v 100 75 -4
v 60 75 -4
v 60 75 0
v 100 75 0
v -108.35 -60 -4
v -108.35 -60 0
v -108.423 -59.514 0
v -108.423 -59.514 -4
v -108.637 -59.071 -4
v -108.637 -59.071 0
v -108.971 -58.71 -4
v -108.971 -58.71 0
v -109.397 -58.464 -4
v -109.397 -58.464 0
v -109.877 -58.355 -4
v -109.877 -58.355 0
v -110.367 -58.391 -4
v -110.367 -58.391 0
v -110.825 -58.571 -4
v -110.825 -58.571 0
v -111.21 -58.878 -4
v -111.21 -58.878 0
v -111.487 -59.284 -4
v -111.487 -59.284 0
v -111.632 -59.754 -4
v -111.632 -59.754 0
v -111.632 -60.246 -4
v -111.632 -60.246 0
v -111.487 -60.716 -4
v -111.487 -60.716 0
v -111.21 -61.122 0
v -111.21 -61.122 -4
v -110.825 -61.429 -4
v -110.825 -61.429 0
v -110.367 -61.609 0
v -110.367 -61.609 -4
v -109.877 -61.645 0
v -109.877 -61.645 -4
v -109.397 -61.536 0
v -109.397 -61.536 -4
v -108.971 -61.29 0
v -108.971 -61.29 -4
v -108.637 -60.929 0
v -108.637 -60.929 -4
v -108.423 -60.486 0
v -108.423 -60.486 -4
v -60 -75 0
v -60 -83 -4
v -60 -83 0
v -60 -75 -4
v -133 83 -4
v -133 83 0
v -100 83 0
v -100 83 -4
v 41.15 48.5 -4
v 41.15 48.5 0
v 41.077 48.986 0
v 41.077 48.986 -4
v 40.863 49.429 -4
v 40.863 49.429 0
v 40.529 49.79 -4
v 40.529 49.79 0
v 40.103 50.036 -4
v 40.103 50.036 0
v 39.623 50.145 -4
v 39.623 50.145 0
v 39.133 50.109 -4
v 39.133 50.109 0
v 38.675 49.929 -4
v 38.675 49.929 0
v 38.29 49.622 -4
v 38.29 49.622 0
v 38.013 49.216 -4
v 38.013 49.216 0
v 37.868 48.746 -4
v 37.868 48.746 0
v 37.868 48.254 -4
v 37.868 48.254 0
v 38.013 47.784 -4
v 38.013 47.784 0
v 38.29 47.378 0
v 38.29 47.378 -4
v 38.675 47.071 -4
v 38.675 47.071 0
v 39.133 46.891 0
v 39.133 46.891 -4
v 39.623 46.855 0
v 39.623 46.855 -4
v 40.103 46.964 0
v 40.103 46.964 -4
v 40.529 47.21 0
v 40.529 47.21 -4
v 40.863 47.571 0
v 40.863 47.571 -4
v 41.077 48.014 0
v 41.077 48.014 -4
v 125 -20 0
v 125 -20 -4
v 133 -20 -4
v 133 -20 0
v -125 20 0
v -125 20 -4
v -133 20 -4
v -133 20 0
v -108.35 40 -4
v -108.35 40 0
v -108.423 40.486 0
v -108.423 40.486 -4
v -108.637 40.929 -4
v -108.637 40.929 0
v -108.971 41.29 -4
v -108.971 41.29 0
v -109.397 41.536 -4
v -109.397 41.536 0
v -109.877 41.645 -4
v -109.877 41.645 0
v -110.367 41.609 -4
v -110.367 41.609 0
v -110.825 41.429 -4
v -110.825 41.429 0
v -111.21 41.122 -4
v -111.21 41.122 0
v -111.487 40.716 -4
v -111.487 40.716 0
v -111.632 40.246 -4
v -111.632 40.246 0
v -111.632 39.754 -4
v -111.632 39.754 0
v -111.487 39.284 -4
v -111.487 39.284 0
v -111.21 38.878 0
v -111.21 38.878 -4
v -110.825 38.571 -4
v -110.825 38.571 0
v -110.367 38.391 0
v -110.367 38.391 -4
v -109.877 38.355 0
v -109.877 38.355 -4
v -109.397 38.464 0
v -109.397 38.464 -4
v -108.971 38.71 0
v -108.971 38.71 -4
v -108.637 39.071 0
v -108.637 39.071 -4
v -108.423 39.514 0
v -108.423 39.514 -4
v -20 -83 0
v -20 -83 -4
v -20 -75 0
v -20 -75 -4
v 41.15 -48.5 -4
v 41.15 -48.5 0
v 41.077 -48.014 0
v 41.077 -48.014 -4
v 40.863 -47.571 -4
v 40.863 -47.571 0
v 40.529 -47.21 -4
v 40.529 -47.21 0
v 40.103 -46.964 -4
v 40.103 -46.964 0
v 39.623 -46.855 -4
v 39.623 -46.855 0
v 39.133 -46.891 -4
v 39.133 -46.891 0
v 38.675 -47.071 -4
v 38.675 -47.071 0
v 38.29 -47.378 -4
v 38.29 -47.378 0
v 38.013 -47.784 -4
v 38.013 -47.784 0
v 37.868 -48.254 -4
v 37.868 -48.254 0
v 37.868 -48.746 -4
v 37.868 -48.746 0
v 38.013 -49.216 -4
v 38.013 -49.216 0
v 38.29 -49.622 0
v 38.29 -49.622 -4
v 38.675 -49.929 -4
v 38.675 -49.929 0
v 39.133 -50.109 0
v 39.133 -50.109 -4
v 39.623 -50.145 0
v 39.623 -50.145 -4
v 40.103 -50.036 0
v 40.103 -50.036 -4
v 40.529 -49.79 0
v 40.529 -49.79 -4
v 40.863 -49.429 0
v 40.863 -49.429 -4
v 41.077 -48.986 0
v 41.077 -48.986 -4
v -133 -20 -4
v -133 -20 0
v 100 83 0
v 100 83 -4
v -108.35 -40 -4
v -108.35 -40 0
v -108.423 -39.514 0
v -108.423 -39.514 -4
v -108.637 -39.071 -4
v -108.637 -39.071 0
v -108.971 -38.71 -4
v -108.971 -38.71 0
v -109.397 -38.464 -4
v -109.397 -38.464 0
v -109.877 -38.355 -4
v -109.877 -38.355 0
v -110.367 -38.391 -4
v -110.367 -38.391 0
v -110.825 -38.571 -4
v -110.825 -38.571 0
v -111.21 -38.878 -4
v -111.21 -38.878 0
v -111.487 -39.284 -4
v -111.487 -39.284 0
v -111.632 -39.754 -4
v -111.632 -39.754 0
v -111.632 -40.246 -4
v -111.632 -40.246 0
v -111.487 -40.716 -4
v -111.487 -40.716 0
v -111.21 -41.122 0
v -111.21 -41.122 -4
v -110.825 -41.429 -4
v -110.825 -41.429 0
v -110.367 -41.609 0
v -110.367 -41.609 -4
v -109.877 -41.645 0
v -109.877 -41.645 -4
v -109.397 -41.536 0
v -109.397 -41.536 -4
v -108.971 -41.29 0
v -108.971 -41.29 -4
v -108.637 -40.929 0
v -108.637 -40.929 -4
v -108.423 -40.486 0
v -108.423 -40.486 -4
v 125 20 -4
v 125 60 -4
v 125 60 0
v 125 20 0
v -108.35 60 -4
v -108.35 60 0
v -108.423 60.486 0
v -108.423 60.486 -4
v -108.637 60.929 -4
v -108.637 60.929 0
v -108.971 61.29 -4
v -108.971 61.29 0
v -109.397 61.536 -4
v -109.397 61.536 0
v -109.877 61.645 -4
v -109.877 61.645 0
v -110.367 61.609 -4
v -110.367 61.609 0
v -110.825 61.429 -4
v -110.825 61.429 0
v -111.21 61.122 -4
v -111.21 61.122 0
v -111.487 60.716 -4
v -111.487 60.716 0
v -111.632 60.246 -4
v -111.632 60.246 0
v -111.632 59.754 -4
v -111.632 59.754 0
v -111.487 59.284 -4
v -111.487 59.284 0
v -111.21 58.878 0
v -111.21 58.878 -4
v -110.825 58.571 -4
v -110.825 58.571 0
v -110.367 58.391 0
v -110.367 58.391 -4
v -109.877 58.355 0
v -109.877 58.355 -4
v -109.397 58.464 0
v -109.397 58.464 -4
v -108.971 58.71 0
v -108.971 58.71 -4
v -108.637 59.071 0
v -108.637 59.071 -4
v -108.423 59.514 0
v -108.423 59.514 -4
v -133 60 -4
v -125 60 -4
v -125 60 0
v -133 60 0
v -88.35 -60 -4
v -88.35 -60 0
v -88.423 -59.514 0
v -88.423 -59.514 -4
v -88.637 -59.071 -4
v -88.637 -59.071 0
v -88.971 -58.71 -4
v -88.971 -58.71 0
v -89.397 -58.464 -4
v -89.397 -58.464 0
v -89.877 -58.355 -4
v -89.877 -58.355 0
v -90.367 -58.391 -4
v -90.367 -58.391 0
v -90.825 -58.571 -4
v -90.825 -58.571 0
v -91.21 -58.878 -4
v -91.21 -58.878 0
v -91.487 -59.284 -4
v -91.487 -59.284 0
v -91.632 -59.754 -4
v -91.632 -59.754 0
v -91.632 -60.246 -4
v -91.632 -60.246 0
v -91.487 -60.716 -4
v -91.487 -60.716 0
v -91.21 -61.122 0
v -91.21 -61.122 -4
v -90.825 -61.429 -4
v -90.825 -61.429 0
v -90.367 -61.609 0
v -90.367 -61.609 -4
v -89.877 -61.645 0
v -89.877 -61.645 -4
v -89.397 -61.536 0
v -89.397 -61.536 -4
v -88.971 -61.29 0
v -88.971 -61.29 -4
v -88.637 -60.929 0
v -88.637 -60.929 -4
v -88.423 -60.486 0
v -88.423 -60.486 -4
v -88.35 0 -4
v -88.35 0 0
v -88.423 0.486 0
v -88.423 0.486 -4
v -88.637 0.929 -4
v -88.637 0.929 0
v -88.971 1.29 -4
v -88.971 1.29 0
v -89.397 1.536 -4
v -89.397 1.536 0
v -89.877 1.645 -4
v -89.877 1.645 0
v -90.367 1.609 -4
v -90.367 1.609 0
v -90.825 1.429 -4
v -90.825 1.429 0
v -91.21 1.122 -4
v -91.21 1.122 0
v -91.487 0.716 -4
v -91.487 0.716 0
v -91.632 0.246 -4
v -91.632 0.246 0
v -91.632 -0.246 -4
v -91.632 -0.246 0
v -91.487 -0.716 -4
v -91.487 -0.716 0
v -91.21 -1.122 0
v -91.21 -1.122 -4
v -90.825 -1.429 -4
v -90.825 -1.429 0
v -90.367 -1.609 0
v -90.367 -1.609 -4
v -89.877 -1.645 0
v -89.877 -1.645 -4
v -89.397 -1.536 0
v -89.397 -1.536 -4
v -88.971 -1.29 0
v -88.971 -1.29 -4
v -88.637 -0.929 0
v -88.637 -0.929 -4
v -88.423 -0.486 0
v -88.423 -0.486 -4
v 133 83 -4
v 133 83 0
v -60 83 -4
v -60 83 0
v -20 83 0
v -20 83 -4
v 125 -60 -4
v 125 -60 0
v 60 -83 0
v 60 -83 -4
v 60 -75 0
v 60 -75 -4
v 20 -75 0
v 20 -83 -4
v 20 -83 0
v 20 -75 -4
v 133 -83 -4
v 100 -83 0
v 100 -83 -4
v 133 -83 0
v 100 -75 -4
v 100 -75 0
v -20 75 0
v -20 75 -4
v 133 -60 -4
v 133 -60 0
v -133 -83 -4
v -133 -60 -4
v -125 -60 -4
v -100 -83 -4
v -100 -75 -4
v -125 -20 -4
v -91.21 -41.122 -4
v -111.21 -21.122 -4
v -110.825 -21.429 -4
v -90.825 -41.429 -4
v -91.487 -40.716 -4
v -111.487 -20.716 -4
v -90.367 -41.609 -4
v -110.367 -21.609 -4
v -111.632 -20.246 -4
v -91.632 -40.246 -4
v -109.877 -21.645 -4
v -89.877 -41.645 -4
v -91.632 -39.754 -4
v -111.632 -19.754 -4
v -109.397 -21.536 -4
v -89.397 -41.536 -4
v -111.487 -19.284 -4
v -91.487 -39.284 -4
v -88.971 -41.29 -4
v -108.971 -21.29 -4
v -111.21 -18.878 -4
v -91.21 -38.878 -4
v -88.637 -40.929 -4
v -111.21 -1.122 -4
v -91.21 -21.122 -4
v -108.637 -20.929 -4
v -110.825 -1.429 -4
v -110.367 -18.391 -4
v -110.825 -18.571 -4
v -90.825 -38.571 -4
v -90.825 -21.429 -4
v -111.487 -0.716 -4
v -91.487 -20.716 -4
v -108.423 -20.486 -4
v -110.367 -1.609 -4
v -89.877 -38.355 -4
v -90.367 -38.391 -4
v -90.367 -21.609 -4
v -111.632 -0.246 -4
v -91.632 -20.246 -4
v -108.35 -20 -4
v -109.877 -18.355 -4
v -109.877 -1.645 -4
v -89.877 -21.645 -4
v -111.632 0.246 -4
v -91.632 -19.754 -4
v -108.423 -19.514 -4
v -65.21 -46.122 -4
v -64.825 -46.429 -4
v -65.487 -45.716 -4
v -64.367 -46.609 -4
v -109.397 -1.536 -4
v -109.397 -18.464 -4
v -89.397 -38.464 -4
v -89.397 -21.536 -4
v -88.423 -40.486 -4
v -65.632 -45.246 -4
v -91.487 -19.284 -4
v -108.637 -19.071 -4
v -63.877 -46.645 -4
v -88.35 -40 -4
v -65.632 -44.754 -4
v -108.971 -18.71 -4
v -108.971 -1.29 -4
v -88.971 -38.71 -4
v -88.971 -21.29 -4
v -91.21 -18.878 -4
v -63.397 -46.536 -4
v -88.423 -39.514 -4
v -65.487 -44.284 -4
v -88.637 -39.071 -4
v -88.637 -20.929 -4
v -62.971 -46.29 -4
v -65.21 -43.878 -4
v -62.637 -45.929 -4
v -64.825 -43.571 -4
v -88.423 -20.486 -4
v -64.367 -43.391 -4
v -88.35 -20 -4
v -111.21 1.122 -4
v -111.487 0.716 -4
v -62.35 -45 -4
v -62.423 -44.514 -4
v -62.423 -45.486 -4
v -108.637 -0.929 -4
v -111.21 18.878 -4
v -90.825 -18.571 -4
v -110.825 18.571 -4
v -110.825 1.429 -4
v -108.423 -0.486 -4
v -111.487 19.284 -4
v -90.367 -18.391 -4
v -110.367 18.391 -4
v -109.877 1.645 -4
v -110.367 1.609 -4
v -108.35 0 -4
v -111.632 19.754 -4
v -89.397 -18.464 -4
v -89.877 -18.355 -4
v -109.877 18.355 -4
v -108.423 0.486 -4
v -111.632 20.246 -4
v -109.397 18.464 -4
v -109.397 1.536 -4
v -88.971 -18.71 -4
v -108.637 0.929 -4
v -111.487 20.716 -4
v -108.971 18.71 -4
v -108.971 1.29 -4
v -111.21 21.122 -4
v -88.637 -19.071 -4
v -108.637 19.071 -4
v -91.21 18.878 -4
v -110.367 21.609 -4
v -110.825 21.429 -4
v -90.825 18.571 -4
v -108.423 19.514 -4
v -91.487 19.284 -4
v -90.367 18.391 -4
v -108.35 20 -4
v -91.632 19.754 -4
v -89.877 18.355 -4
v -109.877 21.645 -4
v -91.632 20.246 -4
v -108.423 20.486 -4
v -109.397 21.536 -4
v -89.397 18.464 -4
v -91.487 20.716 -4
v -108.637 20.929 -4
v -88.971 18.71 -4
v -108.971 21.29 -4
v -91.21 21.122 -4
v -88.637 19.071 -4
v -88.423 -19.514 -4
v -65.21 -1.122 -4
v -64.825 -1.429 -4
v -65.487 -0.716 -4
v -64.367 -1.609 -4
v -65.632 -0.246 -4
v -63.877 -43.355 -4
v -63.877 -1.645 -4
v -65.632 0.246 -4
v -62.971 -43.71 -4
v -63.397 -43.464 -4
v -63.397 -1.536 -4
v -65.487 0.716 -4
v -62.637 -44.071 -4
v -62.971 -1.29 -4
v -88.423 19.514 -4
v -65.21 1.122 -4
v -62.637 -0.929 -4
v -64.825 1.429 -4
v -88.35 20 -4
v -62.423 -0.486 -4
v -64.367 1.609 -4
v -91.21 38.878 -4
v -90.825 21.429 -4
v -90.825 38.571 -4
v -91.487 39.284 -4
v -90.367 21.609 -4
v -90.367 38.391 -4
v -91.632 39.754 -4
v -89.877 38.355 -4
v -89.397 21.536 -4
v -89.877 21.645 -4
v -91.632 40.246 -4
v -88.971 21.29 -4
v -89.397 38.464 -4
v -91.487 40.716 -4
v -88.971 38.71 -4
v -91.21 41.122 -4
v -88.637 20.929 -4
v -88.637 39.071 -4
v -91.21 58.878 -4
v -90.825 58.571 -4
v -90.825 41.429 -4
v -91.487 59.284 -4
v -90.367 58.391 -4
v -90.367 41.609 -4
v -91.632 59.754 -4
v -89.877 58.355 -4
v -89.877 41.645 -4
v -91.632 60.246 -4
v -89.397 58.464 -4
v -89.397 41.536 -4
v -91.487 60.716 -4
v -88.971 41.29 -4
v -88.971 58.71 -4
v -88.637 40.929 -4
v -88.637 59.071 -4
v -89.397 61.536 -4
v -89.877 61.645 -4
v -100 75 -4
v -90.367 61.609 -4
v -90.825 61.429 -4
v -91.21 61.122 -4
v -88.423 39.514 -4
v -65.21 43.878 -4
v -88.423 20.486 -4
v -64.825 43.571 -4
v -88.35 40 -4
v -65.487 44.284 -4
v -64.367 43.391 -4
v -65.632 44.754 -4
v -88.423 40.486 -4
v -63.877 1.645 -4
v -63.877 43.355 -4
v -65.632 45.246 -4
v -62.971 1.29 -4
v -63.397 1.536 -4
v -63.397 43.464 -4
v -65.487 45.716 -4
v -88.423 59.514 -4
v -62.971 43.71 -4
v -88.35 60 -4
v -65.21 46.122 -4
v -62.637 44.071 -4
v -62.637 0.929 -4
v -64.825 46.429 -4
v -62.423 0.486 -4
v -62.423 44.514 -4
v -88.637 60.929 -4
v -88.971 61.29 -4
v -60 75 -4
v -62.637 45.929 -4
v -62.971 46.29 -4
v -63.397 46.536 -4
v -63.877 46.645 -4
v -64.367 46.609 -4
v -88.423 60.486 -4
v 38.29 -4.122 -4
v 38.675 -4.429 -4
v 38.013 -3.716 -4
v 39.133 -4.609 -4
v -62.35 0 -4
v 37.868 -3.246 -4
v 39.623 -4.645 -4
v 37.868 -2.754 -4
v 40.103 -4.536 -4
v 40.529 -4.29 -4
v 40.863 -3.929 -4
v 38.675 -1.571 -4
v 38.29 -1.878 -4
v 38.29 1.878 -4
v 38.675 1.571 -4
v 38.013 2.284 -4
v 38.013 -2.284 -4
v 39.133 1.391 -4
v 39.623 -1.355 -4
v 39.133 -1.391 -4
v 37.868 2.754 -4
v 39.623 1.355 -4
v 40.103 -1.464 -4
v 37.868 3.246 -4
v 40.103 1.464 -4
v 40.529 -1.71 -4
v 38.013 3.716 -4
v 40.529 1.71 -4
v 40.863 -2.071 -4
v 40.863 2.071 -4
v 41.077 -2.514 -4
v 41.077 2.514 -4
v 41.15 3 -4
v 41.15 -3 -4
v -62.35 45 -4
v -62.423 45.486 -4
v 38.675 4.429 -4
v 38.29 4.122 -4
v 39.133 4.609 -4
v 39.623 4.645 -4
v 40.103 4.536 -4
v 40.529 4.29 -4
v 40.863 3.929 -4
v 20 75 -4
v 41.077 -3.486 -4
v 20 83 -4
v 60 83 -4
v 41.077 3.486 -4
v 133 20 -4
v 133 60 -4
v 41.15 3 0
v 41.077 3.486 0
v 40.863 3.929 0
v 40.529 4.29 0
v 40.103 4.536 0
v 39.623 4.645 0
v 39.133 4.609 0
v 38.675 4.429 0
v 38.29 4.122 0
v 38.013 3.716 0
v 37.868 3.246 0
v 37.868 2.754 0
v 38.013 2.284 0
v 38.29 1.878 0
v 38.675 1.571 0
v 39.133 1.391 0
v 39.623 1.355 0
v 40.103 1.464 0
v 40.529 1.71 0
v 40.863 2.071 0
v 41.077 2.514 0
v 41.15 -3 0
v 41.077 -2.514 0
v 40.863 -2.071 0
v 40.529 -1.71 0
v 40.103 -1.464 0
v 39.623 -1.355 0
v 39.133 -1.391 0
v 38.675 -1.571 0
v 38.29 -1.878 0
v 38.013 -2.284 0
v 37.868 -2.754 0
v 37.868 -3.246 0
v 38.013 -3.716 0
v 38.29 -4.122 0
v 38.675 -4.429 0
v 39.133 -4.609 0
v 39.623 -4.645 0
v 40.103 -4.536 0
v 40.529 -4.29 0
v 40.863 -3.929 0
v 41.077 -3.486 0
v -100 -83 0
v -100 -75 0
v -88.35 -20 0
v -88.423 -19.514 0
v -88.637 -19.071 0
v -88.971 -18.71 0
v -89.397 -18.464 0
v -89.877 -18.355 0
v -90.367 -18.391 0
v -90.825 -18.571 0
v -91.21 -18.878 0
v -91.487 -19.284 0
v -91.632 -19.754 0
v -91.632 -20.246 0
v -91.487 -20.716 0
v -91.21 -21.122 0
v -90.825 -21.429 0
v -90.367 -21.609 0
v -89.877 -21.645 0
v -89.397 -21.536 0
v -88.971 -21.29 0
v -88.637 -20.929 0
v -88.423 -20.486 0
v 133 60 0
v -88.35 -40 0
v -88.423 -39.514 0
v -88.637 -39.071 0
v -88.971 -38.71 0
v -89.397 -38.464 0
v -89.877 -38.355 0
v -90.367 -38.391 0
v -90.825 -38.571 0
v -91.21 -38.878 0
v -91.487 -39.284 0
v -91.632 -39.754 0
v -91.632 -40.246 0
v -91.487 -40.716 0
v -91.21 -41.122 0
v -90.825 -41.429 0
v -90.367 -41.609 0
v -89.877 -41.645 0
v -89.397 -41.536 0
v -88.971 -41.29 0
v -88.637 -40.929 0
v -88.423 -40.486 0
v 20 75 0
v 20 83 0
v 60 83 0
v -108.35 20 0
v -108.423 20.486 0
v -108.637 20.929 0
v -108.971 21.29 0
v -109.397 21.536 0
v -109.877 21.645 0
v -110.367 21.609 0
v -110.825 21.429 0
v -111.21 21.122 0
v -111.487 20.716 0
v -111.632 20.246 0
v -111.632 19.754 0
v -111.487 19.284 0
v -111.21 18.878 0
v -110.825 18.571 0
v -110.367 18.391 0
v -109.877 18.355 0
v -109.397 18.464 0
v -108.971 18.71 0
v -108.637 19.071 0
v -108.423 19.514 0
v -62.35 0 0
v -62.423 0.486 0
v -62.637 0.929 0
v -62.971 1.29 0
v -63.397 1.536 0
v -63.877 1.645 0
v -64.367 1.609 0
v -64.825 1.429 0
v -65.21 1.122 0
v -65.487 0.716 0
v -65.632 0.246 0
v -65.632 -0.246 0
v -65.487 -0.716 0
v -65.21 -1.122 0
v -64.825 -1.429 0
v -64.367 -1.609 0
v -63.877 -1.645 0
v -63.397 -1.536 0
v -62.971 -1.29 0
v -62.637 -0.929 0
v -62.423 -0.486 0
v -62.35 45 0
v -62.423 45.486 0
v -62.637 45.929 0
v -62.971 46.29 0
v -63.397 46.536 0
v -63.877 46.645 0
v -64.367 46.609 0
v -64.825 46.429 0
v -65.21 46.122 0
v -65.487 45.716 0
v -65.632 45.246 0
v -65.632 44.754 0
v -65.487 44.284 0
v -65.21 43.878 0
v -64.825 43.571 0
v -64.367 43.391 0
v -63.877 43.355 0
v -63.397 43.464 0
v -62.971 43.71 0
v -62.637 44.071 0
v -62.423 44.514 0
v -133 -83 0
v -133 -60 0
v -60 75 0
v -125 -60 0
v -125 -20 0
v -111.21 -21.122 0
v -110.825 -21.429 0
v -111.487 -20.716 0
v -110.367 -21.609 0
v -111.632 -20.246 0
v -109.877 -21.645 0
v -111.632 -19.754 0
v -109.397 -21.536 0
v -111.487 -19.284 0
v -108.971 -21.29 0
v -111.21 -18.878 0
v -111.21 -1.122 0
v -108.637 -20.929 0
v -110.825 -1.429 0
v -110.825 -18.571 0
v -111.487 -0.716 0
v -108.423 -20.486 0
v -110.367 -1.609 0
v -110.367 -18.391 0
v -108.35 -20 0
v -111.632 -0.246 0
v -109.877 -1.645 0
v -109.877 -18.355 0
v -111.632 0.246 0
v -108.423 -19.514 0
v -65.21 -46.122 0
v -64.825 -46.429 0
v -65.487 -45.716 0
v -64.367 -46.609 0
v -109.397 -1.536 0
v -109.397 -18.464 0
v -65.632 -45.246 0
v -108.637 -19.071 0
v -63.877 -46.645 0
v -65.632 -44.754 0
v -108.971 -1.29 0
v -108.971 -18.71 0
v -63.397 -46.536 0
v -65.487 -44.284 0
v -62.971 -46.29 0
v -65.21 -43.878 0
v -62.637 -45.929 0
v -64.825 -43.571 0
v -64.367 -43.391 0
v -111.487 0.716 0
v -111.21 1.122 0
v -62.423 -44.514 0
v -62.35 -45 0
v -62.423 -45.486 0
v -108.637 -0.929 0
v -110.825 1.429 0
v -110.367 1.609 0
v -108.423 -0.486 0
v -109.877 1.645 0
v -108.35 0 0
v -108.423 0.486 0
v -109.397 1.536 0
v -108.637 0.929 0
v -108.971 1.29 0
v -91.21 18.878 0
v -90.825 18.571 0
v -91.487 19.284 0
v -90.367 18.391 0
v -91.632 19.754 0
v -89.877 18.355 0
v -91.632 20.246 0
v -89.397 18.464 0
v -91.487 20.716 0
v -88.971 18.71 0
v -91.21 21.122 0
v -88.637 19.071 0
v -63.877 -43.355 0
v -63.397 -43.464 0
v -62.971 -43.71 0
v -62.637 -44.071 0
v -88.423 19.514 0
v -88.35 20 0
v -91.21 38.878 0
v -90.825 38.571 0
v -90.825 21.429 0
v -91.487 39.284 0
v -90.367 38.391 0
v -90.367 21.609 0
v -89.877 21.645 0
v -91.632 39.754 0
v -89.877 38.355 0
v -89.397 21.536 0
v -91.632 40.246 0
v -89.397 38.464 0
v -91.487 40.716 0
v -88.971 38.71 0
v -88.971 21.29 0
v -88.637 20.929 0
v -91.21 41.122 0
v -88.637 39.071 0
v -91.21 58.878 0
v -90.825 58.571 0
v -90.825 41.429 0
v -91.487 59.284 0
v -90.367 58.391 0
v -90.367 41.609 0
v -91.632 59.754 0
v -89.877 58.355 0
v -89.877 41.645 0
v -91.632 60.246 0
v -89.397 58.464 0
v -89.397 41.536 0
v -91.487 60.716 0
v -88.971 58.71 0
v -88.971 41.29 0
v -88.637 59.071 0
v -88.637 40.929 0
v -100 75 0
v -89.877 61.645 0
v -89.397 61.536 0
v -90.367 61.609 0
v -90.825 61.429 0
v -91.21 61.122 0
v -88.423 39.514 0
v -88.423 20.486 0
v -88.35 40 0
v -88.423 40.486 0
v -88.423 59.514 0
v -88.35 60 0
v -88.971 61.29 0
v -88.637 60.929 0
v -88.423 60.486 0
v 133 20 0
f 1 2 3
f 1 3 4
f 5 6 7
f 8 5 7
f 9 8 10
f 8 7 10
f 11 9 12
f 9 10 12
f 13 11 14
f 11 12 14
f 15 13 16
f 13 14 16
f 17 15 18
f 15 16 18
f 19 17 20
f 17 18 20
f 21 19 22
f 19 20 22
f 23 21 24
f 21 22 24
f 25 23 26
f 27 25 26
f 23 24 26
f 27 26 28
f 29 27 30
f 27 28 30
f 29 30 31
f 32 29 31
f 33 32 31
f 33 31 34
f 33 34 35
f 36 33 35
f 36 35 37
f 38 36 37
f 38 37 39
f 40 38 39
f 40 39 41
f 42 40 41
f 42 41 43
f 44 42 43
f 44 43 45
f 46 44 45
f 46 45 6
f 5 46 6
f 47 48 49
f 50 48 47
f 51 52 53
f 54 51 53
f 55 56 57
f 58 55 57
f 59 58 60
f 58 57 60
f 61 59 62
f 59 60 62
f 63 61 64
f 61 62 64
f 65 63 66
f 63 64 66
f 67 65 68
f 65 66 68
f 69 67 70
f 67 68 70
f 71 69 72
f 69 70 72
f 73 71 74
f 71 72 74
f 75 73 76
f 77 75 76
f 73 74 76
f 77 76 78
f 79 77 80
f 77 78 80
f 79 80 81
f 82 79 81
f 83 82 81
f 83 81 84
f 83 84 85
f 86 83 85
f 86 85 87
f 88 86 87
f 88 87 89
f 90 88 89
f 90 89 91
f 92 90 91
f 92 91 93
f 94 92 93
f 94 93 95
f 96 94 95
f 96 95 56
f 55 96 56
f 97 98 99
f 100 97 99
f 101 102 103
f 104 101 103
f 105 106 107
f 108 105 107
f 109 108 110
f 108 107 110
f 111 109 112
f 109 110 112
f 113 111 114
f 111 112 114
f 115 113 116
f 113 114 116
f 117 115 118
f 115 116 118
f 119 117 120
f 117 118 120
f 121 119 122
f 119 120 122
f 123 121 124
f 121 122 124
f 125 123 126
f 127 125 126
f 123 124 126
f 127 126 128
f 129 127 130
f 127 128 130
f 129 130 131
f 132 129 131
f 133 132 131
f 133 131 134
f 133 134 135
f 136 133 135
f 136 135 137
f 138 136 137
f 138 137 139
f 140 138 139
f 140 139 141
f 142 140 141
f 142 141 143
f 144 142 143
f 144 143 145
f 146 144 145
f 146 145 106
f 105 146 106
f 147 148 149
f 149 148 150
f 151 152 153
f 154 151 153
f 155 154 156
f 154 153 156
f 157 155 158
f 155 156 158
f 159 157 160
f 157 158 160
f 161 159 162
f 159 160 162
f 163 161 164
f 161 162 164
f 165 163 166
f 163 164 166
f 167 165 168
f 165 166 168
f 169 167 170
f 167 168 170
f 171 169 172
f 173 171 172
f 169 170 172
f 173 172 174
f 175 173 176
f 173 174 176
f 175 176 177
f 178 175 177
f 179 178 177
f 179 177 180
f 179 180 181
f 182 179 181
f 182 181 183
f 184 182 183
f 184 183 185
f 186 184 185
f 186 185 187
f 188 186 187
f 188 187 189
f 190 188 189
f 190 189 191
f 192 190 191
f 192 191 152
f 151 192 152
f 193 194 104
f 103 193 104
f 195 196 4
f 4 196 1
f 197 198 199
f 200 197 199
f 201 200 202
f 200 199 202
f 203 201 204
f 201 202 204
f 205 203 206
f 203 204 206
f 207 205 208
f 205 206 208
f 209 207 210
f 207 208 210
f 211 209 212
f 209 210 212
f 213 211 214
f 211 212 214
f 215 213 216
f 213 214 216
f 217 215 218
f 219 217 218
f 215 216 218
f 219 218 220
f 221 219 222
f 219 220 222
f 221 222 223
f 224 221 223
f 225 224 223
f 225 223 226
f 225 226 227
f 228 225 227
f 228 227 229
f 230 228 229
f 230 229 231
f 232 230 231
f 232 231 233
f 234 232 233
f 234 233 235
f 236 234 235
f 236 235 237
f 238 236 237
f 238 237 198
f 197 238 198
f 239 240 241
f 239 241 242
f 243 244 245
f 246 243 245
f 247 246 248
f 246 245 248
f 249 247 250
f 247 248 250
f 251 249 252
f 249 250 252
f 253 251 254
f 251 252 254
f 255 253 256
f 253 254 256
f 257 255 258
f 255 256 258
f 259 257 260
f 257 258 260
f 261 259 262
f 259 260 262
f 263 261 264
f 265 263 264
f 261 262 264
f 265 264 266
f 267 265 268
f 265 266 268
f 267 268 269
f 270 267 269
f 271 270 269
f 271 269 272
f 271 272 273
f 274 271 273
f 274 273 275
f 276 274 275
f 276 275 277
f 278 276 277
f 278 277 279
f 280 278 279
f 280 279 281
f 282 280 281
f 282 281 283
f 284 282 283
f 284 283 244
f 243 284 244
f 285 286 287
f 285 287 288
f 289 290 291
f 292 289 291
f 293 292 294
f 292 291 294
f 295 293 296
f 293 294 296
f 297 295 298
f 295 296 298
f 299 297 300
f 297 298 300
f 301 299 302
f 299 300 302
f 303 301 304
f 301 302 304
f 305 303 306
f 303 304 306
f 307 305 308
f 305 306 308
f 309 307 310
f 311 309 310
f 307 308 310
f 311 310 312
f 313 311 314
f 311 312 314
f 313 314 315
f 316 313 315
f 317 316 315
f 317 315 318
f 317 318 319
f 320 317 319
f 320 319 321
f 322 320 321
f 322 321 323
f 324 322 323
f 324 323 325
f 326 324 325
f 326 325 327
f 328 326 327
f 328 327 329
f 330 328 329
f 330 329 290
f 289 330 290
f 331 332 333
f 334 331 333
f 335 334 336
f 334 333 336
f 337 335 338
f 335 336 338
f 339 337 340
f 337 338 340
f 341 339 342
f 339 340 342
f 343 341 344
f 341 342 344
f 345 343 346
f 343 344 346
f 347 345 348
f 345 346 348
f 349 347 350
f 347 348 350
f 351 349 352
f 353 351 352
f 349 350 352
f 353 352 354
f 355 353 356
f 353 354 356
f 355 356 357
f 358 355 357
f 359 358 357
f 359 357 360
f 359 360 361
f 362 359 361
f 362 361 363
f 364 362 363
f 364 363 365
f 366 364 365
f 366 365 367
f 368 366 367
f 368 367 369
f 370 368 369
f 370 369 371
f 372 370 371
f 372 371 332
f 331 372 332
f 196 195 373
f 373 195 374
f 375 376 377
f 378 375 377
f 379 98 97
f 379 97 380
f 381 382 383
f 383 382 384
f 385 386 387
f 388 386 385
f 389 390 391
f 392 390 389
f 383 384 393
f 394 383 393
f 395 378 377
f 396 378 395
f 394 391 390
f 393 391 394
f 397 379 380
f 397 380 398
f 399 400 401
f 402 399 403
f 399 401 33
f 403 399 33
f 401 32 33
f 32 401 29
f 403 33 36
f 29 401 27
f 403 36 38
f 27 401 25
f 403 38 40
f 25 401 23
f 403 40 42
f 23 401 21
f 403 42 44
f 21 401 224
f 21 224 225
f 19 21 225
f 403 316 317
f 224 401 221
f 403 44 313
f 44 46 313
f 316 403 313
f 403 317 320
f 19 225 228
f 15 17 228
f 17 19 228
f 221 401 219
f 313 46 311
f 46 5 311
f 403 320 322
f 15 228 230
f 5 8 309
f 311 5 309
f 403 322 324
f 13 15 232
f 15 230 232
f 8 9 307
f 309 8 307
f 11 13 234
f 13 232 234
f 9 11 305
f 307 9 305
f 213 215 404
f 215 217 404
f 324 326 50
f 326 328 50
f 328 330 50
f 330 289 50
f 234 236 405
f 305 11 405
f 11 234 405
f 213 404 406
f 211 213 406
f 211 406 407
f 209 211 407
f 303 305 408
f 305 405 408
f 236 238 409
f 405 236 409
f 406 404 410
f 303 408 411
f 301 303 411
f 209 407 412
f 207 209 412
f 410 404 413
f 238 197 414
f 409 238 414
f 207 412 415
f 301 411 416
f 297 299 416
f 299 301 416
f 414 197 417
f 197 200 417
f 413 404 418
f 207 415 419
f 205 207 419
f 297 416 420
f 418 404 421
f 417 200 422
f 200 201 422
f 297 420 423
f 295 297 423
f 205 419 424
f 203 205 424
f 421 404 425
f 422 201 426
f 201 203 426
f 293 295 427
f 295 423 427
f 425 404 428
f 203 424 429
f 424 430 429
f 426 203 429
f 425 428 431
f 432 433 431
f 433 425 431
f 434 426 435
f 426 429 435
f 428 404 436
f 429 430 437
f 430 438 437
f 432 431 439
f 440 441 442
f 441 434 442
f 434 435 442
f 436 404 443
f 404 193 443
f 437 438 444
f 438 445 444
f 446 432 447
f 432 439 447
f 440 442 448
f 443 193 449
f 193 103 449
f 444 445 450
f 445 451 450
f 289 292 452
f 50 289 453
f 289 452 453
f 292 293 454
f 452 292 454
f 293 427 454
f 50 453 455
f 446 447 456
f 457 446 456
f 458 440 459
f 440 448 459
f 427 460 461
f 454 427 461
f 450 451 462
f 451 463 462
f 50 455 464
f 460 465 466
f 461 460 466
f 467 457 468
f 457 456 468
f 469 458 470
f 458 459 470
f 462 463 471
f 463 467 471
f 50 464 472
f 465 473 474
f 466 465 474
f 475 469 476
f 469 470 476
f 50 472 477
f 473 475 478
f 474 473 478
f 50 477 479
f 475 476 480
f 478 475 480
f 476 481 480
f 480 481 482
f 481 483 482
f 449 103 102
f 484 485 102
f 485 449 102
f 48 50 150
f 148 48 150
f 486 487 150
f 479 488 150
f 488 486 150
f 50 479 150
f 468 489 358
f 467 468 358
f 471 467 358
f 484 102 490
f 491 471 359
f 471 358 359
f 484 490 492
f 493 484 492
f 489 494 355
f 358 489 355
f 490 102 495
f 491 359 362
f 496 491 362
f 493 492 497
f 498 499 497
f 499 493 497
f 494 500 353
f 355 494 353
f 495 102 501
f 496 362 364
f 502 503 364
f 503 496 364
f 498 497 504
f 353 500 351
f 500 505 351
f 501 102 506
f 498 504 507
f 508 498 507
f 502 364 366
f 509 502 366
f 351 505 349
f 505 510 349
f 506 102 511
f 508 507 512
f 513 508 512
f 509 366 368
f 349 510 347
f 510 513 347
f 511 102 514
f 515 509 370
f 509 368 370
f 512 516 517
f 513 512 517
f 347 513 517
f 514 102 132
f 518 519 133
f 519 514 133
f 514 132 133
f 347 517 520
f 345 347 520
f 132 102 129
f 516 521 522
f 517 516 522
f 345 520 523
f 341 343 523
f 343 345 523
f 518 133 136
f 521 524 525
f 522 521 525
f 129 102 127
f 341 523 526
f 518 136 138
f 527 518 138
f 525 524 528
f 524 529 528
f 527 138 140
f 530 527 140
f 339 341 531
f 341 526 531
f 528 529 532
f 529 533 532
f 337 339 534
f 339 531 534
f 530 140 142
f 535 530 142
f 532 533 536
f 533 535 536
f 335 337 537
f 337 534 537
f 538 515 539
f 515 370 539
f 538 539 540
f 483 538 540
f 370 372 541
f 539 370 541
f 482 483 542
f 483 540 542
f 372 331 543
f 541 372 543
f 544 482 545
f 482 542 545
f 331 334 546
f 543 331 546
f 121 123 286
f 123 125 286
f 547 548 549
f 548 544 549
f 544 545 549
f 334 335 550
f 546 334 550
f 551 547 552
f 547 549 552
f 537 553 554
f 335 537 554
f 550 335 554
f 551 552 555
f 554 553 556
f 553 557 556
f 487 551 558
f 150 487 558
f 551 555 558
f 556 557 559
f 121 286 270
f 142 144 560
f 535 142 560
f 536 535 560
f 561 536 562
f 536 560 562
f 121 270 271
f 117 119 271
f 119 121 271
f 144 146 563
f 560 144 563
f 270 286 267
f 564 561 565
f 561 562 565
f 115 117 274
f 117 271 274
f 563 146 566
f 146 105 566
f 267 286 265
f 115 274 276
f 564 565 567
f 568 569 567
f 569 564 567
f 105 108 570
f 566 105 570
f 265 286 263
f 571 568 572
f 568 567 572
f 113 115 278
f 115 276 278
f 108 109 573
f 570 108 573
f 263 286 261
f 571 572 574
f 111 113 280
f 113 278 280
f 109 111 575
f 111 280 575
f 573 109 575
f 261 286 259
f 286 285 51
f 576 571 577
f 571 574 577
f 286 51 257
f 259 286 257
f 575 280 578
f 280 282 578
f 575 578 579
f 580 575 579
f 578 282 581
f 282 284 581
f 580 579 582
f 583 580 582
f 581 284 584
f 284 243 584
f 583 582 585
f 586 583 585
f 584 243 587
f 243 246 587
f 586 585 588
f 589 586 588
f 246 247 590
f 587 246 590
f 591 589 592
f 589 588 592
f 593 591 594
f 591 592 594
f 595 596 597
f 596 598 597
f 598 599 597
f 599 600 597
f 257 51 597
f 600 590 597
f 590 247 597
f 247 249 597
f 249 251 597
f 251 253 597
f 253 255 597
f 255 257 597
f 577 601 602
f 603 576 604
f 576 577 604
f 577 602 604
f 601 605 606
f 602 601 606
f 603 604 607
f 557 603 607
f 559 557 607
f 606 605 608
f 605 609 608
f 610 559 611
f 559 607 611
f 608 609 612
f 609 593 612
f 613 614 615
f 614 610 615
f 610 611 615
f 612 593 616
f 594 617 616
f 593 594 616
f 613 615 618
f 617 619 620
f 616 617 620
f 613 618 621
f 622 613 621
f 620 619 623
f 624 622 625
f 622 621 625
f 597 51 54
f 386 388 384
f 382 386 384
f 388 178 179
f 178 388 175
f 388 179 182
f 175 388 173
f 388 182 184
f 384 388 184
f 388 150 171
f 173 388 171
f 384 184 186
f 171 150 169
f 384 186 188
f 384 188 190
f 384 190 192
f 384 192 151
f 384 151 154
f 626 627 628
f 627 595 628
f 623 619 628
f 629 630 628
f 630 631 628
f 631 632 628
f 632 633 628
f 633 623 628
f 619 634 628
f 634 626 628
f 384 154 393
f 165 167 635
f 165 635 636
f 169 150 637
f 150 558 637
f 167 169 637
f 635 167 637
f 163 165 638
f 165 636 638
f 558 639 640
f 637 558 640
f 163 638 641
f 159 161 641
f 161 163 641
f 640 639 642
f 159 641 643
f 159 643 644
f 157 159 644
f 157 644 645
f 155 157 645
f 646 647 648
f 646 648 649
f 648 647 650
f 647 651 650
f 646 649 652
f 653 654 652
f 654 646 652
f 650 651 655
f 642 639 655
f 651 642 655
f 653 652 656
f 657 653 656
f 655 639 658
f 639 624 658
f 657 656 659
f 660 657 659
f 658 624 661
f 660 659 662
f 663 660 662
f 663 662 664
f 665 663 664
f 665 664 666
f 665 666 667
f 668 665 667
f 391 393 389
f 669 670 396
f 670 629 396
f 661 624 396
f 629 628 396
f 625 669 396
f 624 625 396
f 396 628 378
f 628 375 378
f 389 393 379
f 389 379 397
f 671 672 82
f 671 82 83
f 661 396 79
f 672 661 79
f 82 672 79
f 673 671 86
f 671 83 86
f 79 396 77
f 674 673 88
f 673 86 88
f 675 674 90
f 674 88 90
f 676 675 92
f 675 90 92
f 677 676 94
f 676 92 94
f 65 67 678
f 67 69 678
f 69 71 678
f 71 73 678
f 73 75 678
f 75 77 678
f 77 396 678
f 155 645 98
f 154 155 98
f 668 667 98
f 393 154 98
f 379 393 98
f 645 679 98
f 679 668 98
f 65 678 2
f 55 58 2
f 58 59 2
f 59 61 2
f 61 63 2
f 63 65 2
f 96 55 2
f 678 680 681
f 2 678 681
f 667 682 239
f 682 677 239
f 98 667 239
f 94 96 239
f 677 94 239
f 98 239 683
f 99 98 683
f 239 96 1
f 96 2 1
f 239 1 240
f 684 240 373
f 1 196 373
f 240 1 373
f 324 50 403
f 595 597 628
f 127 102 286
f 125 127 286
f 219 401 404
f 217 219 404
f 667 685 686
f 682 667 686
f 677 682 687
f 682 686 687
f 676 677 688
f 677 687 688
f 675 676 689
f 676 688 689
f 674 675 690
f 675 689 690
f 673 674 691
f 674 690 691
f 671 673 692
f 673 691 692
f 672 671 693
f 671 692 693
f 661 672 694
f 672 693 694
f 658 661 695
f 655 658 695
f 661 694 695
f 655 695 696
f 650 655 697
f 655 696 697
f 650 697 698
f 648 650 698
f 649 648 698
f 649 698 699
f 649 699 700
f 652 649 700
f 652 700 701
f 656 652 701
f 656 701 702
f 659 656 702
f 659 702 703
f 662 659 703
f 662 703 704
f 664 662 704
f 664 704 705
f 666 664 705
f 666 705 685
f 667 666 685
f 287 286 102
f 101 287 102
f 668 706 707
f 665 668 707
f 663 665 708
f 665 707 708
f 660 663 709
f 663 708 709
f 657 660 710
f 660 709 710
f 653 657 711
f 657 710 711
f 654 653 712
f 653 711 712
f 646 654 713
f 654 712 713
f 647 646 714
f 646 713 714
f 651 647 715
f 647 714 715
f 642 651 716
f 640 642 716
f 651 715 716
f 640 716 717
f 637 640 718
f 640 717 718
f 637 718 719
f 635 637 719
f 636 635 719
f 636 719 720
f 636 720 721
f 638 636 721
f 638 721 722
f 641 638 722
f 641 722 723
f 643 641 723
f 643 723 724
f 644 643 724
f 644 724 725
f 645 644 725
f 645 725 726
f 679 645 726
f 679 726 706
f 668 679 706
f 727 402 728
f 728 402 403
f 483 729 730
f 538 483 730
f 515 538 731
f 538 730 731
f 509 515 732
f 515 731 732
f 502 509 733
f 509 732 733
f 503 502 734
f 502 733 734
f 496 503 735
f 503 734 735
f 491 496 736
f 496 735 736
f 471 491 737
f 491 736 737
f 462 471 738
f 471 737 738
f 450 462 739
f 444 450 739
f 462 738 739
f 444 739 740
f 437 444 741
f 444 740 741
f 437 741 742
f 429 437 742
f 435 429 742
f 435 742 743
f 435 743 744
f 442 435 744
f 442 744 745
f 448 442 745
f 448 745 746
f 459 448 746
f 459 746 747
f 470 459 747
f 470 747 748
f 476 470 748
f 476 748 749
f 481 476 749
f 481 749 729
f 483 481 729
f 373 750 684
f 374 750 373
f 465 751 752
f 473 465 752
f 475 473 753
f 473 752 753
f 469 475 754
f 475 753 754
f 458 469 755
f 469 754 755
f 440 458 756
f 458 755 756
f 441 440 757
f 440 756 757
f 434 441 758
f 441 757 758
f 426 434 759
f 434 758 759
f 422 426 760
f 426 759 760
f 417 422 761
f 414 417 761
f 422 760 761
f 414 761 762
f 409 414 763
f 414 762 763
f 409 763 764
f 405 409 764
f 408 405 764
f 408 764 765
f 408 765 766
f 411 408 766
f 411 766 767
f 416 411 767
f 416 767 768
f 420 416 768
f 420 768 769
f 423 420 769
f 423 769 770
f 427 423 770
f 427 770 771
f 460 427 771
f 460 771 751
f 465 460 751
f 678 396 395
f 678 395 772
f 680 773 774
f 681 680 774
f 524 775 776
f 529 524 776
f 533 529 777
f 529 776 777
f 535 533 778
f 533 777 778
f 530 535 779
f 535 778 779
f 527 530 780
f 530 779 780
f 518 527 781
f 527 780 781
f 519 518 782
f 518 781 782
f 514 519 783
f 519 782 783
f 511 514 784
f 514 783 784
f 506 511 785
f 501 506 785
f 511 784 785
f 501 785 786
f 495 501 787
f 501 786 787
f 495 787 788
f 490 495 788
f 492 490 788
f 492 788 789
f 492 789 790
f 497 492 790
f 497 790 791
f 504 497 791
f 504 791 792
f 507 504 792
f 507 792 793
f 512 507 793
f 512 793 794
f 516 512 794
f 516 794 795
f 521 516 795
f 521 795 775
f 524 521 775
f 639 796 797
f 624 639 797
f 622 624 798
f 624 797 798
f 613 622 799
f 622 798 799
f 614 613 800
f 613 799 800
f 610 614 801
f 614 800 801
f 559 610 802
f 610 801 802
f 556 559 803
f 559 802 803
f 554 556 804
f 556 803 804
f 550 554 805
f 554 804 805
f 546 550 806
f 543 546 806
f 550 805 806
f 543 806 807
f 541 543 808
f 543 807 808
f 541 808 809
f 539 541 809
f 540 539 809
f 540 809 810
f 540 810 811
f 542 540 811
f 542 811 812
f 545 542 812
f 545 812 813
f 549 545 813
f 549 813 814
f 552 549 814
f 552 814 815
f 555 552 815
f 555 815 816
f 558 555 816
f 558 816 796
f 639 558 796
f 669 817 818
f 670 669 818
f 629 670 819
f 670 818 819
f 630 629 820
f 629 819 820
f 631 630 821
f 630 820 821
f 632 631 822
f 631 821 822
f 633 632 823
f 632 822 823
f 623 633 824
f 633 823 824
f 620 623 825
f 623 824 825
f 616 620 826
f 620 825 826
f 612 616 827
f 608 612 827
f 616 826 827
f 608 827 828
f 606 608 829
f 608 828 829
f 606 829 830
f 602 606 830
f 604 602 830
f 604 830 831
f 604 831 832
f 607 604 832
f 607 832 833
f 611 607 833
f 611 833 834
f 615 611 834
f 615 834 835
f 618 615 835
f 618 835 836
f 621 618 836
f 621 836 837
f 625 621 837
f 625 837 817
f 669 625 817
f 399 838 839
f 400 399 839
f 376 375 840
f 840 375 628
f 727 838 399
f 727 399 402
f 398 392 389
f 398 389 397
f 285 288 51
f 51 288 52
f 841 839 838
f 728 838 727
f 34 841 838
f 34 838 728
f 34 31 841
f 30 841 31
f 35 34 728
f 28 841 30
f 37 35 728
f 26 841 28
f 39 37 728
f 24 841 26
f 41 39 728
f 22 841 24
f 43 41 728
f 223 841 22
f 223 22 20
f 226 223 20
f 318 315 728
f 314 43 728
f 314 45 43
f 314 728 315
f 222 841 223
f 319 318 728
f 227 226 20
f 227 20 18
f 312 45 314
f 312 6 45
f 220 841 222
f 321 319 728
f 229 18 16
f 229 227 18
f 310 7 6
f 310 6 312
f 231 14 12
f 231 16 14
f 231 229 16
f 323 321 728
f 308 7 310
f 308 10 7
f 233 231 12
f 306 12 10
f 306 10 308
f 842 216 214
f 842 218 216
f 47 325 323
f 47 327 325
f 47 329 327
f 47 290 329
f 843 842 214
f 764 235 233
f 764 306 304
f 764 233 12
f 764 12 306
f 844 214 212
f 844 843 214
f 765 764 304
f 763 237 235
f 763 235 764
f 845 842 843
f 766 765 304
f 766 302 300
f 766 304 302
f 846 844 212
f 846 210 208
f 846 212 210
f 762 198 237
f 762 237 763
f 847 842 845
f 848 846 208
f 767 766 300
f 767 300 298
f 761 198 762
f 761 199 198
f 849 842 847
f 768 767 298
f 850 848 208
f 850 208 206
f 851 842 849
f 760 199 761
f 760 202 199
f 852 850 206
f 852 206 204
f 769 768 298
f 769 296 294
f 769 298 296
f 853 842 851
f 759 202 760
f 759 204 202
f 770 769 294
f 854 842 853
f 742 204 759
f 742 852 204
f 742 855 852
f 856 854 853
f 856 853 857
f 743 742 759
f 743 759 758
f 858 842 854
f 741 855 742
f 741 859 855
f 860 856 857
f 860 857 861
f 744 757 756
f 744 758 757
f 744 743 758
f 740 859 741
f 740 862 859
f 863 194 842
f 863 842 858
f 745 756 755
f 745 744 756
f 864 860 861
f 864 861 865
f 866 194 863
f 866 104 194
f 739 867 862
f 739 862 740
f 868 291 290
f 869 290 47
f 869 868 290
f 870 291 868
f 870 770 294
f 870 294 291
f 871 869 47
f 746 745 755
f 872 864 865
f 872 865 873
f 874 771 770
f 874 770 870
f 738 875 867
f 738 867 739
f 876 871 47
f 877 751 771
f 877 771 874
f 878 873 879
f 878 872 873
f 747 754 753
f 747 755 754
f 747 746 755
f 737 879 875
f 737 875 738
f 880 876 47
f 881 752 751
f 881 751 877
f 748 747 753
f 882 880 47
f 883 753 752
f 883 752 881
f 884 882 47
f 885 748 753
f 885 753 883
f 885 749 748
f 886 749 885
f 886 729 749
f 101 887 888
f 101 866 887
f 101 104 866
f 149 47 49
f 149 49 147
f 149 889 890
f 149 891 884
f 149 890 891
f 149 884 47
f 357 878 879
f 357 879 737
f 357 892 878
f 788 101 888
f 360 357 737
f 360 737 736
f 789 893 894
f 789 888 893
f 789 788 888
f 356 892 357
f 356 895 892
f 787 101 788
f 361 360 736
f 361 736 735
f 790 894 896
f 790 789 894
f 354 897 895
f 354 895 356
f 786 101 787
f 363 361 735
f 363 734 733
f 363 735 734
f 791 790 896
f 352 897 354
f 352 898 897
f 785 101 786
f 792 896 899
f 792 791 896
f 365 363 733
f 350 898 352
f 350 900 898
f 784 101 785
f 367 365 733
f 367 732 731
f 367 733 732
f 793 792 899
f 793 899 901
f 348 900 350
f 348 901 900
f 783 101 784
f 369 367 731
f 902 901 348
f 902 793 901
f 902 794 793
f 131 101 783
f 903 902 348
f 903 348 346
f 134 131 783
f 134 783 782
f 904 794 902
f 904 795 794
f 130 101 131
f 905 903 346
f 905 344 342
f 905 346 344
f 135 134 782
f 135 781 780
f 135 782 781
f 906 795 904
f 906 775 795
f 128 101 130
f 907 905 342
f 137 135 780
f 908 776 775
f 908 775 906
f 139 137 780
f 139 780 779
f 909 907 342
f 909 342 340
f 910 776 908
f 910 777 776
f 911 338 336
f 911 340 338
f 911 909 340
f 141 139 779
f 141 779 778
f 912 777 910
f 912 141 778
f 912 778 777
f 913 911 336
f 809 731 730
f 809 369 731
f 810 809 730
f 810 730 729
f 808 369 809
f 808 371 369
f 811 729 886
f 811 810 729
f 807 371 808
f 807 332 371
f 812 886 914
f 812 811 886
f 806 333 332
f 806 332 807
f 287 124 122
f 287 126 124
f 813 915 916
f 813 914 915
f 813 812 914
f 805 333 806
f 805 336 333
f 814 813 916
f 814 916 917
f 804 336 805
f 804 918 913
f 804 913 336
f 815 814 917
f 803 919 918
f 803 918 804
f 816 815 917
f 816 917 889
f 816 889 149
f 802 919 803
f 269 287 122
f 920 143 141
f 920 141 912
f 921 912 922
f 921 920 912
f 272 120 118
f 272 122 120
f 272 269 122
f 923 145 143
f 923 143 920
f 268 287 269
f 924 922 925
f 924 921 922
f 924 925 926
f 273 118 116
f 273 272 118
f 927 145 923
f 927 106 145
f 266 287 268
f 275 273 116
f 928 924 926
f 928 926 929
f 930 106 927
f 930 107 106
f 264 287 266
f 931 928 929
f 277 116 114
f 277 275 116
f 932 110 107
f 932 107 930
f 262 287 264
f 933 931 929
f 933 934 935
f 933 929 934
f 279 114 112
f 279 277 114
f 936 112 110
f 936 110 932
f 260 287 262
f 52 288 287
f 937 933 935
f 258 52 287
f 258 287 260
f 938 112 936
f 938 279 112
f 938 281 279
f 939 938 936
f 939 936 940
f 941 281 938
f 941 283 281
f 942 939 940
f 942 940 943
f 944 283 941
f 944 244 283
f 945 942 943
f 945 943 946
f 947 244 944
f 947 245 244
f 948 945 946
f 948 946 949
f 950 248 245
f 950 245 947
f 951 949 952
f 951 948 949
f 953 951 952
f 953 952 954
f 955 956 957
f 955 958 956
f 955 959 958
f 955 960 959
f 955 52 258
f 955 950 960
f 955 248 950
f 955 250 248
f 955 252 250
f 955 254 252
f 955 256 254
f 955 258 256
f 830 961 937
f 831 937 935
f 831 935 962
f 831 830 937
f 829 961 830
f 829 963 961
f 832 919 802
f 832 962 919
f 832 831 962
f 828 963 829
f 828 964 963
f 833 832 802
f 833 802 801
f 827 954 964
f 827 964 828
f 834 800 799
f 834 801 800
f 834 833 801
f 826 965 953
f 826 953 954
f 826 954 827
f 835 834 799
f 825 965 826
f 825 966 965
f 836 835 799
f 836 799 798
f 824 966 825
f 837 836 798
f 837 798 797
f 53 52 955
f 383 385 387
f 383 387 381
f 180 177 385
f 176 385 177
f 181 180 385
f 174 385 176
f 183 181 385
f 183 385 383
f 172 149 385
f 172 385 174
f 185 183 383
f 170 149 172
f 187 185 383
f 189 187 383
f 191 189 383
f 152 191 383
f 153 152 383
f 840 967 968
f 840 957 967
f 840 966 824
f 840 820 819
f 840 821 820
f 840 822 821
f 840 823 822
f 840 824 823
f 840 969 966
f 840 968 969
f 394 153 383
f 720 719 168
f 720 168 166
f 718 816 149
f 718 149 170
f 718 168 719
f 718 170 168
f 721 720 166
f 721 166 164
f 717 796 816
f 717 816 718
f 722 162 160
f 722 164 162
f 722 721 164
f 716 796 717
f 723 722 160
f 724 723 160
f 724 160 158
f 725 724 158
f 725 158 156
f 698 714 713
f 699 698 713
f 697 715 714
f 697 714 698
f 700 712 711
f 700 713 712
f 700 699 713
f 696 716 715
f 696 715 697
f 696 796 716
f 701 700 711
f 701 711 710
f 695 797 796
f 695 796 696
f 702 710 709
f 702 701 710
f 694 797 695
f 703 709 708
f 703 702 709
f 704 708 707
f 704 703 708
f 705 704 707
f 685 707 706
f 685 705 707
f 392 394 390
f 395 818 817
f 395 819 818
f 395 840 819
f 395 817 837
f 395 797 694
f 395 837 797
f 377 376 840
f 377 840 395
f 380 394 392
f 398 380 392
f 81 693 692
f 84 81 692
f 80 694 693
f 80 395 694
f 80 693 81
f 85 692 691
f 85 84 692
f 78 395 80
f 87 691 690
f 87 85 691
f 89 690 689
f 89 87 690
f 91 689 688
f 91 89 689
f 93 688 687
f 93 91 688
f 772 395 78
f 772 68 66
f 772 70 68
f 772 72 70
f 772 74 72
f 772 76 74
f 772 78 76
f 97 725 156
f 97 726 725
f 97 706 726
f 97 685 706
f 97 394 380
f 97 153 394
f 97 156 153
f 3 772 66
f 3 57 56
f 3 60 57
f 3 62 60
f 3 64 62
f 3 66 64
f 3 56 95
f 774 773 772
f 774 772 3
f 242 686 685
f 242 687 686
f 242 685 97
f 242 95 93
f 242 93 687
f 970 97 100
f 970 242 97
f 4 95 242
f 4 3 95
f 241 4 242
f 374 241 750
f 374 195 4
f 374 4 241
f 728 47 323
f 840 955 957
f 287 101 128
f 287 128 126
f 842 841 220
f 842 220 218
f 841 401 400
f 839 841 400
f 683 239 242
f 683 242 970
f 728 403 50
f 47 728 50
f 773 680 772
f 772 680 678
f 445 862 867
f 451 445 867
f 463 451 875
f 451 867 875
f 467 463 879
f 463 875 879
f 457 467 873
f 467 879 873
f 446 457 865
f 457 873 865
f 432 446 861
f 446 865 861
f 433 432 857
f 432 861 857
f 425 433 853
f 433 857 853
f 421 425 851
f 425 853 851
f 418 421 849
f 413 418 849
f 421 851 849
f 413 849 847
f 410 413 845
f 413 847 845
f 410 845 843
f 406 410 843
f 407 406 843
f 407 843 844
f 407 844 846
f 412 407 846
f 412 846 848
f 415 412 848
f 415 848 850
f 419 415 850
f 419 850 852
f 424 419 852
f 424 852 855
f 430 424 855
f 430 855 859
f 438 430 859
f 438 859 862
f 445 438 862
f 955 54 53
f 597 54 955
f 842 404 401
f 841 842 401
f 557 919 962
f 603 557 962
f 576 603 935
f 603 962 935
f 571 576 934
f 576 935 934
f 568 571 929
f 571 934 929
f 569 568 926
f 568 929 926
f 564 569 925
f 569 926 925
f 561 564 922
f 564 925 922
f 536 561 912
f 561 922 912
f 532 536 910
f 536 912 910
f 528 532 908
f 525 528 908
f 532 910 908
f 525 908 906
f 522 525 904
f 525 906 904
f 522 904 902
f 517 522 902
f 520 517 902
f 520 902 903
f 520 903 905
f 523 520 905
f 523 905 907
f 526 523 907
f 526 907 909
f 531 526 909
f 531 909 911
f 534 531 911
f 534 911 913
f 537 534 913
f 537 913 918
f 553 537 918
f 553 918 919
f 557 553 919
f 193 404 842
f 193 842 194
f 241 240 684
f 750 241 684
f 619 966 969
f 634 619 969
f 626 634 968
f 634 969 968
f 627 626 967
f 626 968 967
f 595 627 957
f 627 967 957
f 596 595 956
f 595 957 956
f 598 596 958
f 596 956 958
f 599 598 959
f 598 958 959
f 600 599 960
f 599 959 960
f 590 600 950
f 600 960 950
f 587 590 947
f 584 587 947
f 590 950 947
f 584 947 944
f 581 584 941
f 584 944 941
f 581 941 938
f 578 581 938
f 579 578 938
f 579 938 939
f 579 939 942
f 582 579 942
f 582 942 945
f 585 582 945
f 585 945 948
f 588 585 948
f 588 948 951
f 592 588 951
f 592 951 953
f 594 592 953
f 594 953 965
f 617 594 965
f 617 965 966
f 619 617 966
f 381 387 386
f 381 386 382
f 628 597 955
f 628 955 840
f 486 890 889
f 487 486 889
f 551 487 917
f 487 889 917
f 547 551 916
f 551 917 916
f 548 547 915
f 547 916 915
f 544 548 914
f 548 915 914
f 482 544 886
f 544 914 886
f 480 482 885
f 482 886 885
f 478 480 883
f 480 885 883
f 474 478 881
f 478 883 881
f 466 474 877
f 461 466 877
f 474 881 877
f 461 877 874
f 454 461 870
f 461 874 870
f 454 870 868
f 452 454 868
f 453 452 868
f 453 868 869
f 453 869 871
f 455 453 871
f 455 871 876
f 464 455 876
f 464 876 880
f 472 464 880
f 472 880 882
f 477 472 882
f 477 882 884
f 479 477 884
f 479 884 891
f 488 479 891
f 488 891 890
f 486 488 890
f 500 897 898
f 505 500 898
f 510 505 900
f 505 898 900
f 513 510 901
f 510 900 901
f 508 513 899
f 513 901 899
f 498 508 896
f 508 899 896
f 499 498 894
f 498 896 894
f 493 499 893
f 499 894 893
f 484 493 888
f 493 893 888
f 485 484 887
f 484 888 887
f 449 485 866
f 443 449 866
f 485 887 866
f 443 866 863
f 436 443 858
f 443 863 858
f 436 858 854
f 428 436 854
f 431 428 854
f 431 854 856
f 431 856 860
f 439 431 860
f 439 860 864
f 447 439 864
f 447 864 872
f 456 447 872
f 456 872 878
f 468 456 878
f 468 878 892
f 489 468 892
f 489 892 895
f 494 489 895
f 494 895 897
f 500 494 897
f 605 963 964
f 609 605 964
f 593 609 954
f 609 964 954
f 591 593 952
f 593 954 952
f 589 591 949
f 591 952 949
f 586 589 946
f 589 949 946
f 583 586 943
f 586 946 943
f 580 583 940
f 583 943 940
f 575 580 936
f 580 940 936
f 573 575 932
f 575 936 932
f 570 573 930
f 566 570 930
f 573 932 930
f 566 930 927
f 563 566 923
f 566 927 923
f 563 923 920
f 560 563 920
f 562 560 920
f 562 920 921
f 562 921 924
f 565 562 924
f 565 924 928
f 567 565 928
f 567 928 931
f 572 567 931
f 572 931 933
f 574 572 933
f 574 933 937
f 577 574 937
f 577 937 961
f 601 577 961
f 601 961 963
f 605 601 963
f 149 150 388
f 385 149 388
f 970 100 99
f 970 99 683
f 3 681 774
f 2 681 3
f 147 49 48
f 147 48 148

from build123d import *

# Parameters (mm, degrees)
SKETCH001_W                   = 266
SKETCH001_H                   = 166
PAD_DEPTH                     = 4
SKETCH016_W                   = 30
SKETCH016_H                   = 40
SKETCH016_W_2                 = 40
SKETCH016_H_2                 = 30
POCKET001_DEPTH               = 631.146916
SKETCH016_MIRRORED002_2_W     = 30
SKETCH016_MIRRORED002_2_H     = 40
SKETCH016_MIRRORED002_2_W_2   = 40
SKETCH016_MIRRORED002_2_H_2   = 30
POCKET001_MIRRORED002_2_DEPTH = 631.146916
SKETCH035_R                   = 1.65
HOLE001_DEPTH                 = 4.001


with BuildPart() as part:
    # Sketch001 → Pad (new body)
    with BuildSketch(Plane.XY):
        Rectangle(SKETCH001_W, SKETCH001_H)
    extrude(amount=-PAD_DEPTH)

    # Sketch016 (on Face6 of Pad) → Pocket001 (cut, through all)
    with BuildSketch(Plane(origin=(0, 0, -4), x_dir=(1, 0, 0), z_dir=(0, 0, -1))):
        with Locations((140, 40)):
            Rectangle(SKETCH016_W, SKETCH016_H)
        with Locations((140, -40)):
            Rectangle(SKETCH016_W, SKETCH016_H)
        with Locations((80, -90)):
            Rectangle(SKETCH016_W_2, SKETCH016_H_2)
        with Locations((0, -90)):
            Rectangle(SKETCH016_W_2, SKETCH016_H_2)
        with Locations((-80, -90)):
            Rectangle(SKETCH016_W_2, SKETCH016_H_2)
    pocket001 = extrude(amount=-POCKET001_DEPTH, mode=Mode.SUBTRACT)

    # Sketch016 Mirrored002 2 → Pocket001 Mirrored002 2 (cut, through all)
    with BuildSketch(Plane(origin=(0, 0, -4), x_dir=(-1, 0, 0), z_dir=(0, 0, 1))):
        with Locations((140, 40)):
            Rectangle(SKETCH016_MIRRORED002_2_W, SKETCH016_MIRRORED002_2_H)
        with Locations((140, -40)):
            Rectangle(SKETCH016_MIRRORED002_2_W, SKETCH016_MIRRORED002_2_H)
        with Locations((80, -90)):
            Rectangle(SKETCH016_MIRRORED002_2_W_2, SKETCH016_MIRRORED002_2_H_2)
        with Locations((0, -90)):
            Rectangle(SKETCH016_MIRRORED002_2_W_2, SKETCH016_MIRRORED002_2_H_2)
        with Locations((-80, -90)):
            Rectangle(SKETCH016_MIRRORED002_2_W_2, SKETCH016_MIRRORED002_2_H_2)
    pocket001_mirrored002_2 = extrude(amount=POCKET001_MIRRORED002_2_DEPTH, mode=Mode.SUBTRACT)

    # Mirrored003: Pocket001, Pocket001 Mirrored002 2 across Sketch016 H_Axis
    add(pocket001.mirror(Plane(origin=(0, 0, -4), x_dir=(0, 0, -1), z_dir=(0, -1, 0))), mode=Mode.SUBTRACT)
    add(pocket001_mirrored002_2.mirror(Plane(origin=(0, 0, -4), x_dir=(0, 0, -1), z_dir=(0, -1, 0))), mode=Mode.SUBTRACT)

    # Sketch035 (on Face2 of MultiTransform) → Hole001 (cut, through all)
    with BuildSketch(Plane.XY):
        with Locations((-64, 45)):
            Circle(SKETCH035_R)
        with Locations((39.5, 48.5)):
            Circle(SKETCH035_R)
        with Locations((39.5, 3)):
            Circle(SKETCH035_R)
        with Locations((39.5, -3)):
            Circle(SKETCH035_R)
        with Locations((39.5, -48.5)):
            Circle(SKETCH035_R)
        with Locations((-64, -45)):
            Circle(SKETCH035_R)
        with Locations((-64, 0)):
            Circle(SKETCH035_R)
        with Locations((-110, -60)):
            Circle(SKETCH035_R)
        with Locations((-90, -60)):
            Circle(SKETCH035_R)
        with Locations((-110, -40)):
            Circle(SKETCH035_R)
        with Locations((-90, -40)):
            Circle(SKETCH035_R)
        with Locations((-110, -20)):
            Circle(SKETCH035_R)
        with Locations((-90, -20)):
            Circle(SKETCH035_R)
        with Locations((-110, 0)):
            Circle(SKETCH035_R)
        with Locations((-90, 0)):
            Circle(SKETCH035_R)
        with Locations((-110, 20)):
            Circle(SKETCH035_R)
        with Locations((-90, 20)):
            Circle(SKETCH035_R)
        with Locations((-110, 40)):
            Circle(SKETCH035_R)
        with Locations((-90, 40)):
            Circle(SKETCH035_R)
        with Locations((-110, 60)):
            Circle(SKETCH035_R)
        with Locations((-90, 60)):
            Circle(SKETCH035_R)
    extrude(amount=-HOLE001_DEPTH, mode=Mode.SUBTRACT)


solid = part.part
